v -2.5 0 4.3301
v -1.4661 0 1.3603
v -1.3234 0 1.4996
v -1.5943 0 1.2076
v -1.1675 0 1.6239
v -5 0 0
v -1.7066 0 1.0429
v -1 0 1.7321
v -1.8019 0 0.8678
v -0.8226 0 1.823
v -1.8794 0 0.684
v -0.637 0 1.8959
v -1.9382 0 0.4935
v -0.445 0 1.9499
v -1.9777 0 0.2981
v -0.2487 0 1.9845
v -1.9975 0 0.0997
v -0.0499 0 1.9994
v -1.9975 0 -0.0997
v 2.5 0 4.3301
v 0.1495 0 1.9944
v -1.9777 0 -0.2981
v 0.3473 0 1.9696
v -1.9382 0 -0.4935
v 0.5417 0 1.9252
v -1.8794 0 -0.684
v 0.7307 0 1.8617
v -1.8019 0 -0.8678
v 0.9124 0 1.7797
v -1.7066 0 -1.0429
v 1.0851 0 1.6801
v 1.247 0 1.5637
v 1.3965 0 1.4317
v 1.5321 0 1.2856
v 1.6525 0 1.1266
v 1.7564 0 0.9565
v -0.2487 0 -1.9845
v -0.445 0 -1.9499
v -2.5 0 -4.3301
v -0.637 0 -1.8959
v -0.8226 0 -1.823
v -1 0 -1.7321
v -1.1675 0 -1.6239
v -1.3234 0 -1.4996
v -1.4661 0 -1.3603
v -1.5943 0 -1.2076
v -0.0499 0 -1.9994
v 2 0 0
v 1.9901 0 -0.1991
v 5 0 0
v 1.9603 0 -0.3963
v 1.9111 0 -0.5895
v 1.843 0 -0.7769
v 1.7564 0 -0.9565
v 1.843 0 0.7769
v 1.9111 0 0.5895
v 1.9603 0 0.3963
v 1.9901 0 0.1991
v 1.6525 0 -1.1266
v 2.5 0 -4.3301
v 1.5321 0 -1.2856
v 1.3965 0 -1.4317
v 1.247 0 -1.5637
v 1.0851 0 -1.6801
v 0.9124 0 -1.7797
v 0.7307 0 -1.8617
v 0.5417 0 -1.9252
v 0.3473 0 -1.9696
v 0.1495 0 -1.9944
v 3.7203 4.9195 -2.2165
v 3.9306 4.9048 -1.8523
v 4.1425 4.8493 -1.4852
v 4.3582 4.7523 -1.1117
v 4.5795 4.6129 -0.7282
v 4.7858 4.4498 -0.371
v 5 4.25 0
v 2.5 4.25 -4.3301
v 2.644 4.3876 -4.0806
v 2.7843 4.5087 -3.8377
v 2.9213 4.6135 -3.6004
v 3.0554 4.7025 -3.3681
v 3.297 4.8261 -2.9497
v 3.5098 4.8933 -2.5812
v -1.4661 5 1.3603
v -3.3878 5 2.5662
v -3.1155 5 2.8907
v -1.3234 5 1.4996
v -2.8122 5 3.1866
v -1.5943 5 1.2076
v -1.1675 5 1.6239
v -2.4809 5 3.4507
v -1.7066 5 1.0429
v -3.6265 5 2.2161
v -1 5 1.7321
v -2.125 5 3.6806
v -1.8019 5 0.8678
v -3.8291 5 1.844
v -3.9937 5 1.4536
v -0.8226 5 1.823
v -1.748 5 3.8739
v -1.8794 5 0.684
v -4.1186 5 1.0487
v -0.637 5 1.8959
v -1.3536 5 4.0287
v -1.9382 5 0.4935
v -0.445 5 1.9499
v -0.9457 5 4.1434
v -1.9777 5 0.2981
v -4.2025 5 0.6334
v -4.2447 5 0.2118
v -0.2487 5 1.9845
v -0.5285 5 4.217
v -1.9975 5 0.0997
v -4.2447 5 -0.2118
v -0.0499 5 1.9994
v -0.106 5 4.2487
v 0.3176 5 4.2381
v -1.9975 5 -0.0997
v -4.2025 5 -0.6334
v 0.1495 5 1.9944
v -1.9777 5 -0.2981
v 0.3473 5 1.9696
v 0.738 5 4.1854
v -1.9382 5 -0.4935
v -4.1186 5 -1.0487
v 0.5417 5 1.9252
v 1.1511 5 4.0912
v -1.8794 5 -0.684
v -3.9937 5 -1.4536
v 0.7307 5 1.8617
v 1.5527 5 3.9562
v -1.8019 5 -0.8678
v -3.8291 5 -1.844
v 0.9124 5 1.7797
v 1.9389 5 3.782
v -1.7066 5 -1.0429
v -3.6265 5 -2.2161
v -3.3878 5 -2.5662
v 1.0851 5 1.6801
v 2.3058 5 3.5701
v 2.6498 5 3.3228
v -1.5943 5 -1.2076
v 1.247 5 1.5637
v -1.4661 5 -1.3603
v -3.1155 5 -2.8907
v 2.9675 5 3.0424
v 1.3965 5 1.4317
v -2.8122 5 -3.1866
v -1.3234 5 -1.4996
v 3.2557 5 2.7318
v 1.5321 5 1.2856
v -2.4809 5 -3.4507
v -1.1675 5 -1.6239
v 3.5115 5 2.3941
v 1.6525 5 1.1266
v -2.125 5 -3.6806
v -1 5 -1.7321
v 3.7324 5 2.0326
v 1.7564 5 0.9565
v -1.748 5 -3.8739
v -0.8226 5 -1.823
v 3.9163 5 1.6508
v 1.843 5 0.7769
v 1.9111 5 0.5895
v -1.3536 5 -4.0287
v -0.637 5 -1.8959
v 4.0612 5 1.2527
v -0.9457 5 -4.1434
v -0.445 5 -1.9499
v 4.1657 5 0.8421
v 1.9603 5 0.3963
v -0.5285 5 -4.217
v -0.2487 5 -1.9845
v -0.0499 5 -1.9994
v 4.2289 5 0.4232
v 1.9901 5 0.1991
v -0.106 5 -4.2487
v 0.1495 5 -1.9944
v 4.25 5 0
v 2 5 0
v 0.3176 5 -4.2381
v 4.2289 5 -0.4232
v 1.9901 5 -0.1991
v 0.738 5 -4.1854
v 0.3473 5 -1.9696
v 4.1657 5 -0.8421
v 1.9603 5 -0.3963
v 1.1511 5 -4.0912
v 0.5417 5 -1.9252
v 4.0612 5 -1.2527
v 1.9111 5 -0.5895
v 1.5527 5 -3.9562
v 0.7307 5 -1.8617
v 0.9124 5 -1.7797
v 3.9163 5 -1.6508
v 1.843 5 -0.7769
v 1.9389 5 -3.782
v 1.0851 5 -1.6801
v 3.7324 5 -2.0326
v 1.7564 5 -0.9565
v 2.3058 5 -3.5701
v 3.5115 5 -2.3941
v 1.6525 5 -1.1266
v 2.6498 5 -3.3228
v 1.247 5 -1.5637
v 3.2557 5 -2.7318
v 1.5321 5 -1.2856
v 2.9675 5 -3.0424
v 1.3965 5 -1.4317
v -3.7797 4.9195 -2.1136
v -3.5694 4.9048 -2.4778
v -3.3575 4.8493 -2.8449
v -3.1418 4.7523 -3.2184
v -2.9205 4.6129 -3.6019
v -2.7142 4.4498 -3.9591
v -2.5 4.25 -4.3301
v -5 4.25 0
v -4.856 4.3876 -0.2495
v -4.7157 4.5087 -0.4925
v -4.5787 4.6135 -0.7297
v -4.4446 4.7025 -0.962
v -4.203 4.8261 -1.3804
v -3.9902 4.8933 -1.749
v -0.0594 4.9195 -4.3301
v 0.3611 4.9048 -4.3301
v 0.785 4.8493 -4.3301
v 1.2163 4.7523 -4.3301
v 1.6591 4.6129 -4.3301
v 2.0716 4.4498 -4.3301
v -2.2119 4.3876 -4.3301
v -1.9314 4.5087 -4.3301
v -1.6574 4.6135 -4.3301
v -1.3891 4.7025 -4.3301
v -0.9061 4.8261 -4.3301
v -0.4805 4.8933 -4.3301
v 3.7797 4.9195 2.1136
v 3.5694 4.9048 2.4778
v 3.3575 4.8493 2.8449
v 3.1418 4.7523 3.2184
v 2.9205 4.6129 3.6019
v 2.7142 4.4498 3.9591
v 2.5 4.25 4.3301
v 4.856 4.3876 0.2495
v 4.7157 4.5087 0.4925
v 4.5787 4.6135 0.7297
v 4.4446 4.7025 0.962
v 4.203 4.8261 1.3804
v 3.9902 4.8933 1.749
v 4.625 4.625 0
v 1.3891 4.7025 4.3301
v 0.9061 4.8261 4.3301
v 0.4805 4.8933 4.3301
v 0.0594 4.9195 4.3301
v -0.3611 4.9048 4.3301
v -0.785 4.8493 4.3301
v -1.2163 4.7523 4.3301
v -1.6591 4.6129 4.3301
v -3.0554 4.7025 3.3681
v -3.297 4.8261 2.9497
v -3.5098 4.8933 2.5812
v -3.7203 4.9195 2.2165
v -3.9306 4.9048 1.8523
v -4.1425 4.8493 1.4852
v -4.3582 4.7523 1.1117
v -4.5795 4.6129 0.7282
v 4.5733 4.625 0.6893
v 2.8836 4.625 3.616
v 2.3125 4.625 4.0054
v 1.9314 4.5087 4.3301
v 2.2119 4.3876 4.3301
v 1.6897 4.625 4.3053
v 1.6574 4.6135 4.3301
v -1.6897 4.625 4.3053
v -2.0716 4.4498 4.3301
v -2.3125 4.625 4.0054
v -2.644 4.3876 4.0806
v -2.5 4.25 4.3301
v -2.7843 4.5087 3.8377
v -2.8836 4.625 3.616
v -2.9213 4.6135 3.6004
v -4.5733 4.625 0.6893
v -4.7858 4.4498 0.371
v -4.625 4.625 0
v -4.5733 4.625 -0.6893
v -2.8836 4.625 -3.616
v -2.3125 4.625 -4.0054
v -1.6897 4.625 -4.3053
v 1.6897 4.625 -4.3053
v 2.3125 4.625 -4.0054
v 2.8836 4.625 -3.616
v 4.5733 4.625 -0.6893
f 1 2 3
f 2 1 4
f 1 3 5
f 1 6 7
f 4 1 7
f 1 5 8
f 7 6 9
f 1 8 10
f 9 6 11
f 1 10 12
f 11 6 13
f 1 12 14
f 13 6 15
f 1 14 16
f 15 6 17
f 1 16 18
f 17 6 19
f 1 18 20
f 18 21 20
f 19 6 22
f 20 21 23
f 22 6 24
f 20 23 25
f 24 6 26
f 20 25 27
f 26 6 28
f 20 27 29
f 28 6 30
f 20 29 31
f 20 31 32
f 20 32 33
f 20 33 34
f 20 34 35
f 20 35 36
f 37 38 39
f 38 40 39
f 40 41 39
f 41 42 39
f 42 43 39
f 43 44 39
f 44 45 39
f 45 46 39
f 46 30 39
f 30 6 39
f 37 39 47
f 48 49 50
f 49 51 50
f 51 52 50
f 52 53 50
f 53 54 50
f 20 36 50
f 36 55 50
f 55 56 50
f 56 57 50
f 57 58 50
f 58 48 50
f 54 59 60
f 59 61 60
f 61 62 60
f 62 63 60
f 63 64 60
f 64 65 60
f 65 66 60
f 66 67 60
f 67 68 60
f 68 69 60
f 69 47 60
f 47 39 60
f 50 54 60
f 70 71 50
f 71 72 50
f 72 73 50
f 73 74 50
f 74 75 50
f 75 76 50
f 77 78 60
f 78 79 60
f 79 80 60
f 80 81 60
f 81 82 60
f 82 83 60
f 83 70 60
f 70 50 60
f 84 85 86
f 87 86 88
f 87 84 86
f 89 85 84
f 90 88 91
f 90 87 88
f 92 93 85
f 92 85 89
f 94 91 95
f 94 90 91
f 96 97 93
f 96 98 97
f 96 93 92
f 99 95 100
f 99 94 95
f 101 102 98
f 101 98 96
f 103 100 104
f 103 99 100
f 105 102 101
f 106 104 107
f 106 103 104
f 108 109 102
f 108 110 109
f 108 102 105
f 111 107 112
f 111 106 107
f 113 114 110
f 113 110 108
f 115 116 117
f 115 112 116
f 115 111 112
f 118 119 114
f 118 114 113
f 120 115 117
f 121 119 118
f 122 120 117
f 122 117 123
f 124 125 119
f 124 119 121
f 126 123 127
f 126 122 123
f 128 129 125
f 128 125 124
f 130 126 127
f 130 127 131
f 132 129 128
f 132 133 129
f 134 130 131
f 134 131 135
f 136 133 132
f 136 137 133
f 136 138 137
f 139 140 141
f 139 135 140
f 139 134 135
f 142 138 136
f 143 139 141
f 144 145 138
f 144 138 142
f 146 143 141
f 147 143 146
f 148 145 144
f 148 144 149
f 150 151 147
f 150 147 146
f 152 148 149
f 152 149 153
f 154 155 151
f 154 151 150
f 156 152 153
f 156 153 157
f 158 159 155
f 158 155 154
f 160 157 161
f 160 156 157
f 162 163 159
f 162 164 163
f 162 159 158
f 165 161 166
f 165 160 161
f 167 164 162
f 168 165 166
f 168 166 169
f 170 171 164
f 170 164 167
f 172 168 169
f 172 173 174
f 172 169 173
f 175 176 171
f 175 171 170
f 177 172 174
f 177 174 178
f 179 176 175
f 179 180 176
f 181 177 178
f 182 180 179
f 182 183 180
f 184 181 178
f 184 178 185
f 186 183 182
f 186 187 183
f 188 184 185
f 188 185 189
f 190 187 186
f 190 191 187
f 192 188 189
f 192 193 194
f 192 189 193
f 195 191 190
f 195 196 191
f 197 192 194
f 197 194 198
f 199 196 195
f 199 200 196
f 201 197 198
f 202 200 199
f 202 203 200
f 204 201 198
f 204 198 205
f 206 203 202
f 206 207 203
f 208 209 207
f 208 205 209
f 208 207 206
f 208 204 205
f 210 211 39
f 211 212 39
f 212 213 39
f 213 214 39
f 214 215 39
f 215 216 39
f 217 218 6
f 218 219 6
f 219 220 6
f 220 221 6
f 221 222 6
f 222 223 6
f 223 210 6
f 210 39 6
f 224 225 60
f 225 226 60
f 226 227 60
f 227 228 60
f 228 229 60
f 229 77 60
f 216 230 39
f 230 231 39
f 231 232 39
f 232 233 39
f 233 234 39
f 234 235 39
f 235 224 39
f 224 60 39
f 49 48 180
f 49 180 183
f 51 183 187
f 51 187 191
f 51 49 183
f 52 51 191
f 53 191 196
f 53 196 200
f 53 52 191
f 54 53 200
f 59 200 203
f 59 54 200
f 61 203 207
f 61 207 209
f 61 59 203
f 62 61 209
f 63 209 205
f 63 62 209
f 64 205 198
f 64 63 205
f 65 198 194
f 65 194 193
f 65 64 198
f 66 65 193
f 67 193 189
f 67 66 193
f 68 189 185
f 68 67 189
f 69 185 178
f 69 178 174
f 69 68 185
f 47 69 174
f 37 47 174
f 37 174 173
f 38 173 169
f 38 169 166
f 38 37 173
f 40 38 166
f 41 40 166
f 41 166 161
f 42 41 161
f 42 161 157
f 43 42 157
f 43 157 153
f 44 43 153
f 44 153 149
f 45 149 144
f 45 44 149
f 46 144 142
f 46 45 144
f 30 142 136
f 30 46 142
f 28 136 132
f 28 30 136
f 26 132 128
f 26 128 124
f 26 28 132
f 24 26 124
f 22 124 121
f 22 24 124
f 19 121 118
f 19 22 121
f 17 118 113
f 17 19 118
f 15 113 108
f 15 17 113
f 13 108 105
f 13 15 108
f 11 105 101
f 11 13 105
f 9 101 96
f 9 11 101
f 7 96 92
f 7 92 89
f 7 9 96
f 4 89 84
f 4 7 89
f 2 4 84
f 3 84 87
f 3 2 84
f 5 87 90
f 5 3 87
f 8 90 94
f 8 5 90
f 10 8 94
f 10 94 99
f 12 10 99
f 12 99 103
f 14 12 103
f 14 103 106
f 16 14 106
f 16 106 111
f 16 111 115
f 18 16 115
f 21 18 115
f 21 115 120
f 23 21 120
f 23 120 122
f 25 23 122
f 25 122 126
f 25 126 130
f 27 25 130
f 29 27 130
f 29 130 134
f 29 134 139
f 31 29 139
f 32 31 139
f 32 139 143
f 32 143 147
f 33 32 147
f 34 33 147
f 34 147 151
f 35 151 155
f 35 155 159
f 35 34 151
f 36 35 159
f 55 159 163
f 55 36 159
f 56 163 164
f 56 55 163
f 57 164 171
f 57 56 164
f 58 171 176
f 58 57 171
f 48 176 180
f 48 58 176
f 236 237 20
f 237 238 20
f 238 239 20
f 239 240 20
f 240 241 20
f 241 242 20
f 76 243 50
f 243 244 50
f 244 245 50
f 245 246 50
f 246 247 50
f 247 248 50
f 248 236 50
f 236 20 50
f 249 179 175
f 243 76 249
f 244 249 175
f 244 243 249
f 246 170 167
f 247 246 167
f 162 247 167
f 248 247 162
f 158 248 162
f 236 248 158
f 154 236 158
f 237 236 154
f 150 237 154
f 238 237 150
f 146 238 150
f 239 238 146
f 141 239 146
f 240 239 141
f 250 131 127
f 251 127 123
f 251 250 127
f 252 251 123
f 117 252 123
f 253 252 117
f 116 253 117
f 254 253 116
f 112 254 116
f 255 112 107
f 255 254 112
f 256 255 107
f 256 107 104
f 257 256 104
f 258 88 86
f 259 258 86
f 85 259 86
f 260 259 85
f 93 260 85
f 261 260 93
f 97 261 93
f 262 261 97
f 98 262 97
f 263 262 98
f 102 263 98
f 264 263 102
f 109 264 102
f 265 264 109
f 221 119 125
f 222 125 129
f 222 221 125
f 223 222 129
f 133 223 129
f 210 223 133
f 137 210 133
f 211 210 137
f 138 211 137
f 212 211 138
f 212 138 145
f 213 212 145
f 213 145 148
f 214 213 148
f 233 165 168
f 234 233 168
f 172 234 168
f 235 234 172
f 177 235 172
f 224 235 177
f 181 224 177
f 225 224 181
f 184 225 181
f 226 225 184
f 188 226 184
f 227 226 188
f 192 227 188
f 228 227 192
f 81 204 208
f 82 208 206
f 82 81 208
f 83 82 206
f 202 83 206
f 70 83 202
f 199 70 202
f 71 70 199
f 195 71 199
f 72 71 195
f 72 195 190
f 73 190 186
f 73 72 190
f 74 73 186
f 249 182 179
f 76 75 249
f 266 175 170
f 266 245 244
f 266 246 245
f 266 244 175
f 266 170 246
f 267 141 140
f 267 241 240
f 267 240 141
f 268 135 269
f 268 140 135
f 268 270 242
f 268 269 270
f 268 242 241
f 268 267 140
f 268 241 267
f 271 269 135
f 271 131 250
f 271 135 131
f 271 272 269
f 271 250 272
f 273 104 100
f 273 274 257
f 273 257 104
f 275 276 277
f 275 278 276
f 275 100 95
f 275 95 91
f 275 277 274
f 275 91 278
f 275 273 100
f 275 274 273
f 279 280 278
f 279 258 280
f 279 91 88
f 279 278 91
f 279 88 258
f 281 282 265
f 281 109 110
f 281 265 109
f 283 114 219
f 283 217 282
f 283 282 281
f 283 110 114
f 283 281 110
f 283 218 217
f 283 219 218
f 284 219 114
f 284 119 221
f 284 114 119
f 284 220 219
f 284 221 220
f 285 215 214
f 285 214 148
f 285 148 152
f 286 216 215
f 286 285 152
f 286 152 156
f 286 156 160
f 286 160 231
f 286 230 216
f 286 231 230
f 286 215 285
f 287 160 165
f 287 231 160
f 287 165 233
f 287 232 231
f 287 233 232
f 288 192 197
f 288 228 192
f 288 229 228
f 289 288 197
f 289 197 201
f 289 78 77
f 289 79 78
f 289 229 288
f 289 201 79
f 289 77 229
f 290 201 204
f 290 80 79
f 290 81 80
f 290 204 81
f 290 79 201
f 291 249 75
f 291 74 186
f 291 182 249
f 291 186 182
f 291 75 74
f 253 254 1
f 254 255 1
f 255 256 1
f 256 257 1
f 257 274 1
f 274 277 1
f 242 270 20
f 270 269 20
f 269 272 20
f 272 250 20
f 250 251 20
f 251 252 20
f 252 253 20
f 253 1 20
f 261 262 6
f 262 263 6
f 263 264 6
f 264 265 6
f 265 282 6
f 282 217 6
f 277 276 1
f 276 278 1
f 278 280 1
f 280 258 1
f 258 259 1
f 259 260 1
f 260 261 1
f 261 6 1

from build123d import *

# Parameters (mm, degrees)
SKETCH1_R           = 2
BOSS_EXTRUDE1_DEPTH = 5
SKETCH2_OUTSIDE_W   = 24.828
SKETCH2_OUTSIDE_H   = 23.488
SKETCH2_OUTSIDE_R   = 4.25
CUT_EXTRUDE1_DEPTH  = 5
CUT_EXTRUDE1_TAPER  = 45


with BuildPart() as part:
    # Sketch1 → Boss-Extrude1 (new body)
    with BuildSketch(Plane(origin=(0, 0, 0), x_dir=(1, 0, 0), z_dir=(0, 1, 0))):
        Polygon((5, 0), (2.5, 4.330127019), (-2.5, 4.330127019), (-5, 0), (-2.5, -4.330127019), (2.5, -4.330127019), align=None)
        Circle(SKETCH1_R, mode=Mode.SUBTRACT)
    extrude(amount=BOSS_EXTRUDE1_DEPTH)

    # Sketch2 outside → Cut-Extrude1 (cut)
    with BuildSketch(Plane(origin=(0, 5, 0), x_dir=(1, 0, 0), z_dir=(0, 1, 0))):
        Rectangle(SKETCH2_OUTSIDE_W, SKETCH2_OUTSIDE_H)
        Circle(SKETCH2_OUTSIDE_R, mode=Mode.SUBTRACT)
    extrude(amount=-CUT_EXTRUDE1_DEPTH, taper=CUT_EXTRUDE1_TAPER, mode=Mode.SUBTRACT)


solid = part.part
